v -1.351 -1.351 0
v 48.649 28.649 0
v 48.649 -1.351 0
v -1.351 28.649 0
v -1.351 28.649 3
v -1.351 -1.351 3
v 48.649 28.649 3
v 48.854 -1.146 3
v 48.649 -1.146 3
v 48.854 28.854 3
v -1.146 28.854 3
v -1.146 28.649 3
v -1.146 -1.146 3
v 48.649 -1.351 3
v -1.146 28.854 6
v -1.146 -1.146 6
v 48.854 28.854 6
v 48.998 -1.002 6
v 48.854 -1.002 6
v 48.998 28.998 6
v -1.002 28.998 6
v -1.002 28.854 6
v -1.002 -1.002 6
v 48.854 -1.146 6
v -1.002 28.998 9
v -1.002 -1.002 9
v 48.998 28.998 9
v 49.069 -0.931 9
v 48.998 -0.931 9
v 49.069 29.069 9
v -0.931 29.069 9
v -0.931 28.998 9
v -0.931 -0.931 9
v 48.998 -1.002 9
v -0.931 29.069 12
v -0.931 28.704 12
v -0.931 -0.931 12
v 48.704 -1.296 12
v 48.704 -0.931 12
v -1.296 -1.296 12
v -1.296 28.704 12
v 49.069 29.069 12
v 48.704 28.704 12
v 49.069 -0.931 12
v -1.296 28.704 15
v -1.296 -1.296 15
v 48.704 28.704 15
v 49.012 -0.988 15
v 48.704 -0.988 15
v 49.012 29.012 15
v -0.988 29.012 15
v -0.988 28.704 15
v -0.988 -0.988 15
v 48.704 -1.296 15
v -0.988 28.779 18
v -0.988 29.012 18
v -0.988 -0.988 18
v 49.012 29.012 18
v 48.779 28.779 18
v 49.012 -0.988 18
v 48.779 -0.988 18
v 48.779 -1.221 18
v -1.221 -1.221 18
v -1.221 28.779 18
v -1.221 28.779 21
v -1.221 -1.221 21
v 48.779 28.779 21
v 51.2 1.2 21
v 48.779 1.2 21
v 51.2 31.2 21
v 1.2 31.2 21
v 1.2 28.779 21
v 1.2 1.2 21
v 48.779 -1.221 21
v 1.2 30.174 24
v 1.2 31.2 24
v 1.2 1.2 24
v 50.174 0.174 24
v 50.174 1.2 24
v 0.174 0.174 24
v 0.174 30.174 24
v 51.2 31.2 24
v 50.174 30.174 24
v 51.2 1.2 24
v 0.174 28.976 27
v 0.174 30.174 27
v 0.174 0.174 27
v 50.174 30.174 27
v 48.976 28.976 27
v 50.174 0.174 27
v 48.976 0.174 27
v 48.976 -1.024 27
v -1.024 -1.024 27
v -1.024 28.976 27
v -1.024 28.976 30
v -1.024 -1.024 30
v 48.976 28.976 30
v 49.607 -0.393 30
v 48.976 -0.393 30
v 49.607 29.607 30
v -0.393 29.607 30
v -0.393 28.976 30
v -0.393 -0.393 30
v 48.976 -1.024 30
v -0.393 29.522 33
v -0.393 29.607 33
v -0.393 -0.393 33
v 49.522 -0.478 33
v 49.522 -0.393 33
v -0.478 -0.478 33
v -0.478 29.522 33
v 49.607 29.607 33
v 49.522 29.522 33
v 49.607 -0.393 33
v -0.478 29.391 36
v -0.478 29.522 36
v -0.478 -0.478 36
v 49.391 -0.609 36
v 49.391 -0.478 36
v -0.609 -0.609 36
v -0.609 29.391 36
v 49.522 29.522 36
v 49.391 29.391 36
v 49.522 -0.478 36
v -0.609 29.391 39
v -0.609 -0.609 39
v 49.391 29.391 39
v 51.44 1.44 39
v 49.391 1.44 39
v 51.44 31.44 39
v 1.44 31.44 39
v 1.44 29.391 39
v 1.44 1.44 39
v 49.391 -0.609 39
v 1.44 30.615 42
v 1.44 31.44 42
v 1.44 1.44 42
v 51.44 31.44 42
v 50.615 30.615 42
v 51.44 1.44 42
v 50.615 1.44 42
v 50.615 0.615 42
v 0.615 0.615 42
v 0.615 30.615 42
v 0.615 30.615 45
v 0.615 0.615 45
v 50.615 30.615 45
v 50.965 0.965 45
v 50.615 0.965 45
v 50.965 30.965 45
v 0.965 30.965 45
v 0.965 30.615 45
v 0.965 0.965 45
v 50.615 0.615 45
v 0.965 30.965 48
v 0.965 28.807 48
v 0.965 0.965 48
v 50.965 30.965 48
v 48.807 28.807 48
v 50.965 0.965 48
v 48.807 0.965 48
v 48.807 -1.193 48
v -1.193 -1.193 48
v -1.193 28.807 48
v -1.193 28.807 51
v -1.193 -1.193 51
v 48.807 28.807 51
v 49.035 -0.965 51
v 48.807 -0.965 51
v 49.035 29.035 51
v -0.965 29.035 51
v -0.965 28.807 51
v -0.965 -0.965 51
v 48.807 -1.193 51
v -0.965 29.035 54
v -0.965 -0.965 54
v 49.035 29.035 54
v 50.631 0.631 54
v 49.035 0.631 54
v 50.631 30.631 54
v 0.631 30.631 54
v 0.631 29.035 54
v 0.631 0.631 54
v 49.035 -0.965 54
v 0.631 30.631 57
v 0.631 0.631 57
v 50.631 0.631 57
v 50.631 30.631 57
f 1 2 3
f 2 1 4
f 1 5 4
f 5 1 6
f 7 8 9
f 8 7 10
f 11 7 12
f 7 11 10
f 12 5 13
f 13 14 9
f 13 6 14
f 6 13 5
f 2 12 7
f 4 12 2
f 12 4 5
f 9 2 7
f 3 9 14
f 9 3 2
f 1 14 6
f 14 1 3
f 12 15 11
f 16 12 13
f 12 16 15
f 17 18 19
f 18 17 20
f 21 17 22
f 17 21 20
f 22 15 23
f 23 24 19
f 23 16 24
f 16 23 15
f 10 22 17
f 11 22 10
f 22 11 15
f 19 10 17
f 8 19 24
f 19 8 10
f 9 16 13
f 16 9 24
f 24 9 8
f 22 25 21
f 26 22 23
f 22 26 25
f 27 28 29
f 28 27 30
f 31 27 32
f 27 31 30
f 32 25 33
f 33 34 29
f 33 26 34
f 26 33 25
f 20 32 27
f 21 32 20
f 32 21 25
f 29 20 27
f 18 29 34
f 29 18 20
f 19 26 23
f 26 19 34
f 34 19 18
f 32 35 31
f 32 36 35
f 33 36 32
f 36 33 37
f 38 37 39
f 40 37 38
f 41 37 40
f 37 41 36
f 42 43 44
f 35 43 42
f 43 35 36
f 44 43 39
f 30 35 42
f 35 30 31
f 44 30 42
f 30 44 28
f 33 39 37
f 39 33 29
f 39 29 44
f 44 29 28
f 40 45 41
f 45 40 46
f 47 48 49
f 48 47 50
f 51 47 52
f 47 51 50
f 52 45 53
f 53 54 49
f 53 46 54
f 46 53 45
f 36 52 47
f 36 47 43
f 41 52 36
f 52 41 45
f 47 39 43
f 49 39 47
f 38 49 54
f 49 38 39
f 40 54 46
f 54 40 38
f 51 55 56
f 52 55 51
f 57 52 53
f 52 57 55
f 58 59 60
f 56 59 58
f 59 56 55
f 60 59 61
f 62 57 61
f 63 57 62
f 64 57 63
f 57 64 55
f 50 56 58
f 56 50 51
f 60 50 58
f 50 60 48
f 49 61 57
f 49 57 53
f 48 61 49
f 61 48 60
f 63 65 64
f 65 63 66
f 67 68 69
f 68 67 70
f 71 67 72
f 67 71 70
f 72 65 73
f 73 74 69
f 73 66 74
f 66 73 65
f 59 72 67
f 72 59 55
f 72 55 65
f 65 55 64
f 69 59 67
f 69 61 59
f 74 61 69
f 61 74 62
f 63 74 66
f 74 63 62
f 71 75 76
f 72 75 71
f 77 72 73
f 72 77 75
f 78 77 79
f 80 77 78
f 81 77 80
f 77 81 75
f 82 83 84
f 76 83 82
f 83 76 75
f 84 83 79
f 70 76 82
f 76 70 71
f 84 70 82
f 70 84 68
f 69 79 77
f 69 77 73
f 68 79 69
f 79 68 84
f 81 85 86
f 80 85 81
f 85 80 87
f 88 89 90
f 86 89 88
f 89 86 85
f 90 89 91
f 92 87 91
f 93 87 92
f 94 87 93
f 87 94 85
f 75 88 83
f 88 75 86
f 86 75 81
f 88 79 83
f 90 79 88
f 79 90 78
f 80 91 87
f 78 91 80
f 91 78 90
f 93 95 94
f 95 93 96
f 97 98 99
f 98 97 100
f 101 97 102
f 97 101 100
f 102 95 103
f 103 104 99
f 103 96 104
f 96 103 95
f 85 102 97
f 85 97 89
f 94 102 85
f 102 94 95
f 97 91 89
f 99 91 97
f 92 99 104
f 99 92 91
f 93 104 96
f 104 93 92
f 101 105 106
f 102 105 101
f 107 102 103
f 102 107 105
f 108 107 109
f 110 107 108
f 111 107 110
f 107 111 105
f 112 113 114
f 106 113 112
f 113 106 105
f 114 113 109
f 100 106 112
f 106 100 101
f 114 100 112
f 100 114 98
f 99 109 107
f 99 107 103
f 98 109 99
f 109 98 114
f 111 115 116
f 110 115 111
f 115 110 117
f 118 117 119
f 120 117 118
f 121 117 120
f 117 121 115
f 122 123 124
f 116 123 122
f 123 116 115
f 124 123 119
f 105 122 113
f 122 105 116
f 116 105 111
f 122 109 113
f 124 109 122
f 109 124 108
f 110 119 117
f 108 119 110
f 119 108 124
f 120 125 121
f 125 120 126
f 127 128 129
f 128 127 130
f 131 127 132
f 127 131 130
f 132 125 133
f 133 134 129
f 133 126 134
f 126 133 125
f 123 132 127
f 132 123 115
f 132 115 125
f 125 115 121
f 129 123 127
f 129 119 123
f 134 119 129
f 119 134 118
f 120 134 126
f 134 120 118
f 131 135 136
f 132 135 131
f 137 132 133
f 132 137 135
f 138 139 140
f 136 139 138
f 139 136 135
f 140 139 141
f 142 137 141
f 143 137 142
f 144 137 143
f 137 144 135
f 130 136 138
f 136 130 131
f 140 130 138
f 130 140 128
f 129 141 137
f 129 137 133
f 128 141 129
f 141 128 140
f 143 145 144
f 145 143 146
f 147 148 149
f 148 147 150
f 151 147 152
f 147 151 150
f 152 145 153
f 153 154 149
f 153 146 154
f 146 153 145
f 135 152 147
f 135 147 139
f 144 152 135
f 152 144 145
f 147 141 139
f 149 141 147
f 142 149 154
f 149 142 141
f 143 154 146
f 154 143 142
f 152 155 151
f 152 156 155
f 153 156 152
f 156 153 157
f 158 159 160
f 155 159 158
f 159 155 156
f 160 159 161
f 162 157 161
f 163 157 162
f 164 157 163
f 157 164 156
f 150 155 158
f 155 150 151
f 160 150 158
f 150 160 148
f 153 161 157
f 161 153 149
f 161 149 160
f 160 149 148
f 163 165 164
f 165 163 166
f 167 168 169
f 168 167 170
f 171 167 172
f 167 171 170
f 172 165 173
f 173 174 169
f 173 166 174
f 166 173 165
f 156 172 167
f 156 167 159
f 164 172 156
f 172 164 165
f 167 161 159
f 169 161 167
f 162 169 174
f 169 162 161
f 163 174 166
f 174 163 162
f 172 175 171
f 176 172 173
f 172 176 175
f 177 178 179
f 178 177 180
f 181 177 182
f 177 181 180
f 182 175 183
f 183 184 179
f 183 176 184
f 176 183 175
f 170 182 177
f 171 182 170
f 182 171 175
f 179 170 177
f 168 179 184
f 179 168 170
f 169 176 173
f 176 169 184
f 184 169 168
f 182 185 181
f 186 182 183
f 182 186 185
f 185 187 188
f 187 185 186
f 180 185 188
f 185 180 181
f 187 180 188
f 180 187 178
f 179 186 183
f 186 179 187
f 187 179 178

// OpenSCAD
// Statsbygg

x=50;
y=30;
z=55;

bleed=.5;
walls=4;
var=walls*.75;

module statsbygg(size, bleed=.5, var=1, stepsize=1, rseedx, rseedy) {
    x = size[0];
    y = size[1];
    
    // init random
    rmin = -var;                    // float
    rmax = var;                     // float

    rvals = size[2]+1;              // int - veit ikke om jeg trenger z+1, men skader ikke
    srand = rands(0,99999,2);  // trengs hvis ikke angitt
    
    rsx = (rseedx == undef) ? srand[0] : rseedx;
    rsy = (rseedy == undef && rsx != undef) ? rsx : 
          (rseedy == undef && rsy == undef) ? srand[1] : rseedy;
    
    xrand = rands(rmin, rmax, rvals, rsx);
    yrand = rands(rmin, rmax, rvals, rsy);
    
    echo("Starting the fun with srand", srand, ", rsx, ", rsx, " and rsy ", rsy);
    xpos = 0;
    ypos = 0;
    
    for (z = [0:stepsize:size[2]]) {
        xpos = xpos + xrand[z];
        ypos = ypos + yrand[z];
        translate([xpos,ypos,z])
            linear_extrude(stepsize)
                square([x+bleed*2,y+bleed*2]);
                //square([size[0]+bleed*2,size[1]+bleed*2]);
    }
}

// Ikke i bruk
module ramme(size, walls=3, bleed=.5) {
    translate([bleed,bleed]) {
        difference() {
            translate([-bleed,-bleed])
                square([size[0]+bleed*2,size[1]+bleed*2]);
            translate([walls,walls]) {
                square([size[0]-walls*2,size[1]-walls*2]);
            }
        }
    }
}


statsbygg(size=[x,y,z], bleed=0, var=1.5, stepsize=3);
